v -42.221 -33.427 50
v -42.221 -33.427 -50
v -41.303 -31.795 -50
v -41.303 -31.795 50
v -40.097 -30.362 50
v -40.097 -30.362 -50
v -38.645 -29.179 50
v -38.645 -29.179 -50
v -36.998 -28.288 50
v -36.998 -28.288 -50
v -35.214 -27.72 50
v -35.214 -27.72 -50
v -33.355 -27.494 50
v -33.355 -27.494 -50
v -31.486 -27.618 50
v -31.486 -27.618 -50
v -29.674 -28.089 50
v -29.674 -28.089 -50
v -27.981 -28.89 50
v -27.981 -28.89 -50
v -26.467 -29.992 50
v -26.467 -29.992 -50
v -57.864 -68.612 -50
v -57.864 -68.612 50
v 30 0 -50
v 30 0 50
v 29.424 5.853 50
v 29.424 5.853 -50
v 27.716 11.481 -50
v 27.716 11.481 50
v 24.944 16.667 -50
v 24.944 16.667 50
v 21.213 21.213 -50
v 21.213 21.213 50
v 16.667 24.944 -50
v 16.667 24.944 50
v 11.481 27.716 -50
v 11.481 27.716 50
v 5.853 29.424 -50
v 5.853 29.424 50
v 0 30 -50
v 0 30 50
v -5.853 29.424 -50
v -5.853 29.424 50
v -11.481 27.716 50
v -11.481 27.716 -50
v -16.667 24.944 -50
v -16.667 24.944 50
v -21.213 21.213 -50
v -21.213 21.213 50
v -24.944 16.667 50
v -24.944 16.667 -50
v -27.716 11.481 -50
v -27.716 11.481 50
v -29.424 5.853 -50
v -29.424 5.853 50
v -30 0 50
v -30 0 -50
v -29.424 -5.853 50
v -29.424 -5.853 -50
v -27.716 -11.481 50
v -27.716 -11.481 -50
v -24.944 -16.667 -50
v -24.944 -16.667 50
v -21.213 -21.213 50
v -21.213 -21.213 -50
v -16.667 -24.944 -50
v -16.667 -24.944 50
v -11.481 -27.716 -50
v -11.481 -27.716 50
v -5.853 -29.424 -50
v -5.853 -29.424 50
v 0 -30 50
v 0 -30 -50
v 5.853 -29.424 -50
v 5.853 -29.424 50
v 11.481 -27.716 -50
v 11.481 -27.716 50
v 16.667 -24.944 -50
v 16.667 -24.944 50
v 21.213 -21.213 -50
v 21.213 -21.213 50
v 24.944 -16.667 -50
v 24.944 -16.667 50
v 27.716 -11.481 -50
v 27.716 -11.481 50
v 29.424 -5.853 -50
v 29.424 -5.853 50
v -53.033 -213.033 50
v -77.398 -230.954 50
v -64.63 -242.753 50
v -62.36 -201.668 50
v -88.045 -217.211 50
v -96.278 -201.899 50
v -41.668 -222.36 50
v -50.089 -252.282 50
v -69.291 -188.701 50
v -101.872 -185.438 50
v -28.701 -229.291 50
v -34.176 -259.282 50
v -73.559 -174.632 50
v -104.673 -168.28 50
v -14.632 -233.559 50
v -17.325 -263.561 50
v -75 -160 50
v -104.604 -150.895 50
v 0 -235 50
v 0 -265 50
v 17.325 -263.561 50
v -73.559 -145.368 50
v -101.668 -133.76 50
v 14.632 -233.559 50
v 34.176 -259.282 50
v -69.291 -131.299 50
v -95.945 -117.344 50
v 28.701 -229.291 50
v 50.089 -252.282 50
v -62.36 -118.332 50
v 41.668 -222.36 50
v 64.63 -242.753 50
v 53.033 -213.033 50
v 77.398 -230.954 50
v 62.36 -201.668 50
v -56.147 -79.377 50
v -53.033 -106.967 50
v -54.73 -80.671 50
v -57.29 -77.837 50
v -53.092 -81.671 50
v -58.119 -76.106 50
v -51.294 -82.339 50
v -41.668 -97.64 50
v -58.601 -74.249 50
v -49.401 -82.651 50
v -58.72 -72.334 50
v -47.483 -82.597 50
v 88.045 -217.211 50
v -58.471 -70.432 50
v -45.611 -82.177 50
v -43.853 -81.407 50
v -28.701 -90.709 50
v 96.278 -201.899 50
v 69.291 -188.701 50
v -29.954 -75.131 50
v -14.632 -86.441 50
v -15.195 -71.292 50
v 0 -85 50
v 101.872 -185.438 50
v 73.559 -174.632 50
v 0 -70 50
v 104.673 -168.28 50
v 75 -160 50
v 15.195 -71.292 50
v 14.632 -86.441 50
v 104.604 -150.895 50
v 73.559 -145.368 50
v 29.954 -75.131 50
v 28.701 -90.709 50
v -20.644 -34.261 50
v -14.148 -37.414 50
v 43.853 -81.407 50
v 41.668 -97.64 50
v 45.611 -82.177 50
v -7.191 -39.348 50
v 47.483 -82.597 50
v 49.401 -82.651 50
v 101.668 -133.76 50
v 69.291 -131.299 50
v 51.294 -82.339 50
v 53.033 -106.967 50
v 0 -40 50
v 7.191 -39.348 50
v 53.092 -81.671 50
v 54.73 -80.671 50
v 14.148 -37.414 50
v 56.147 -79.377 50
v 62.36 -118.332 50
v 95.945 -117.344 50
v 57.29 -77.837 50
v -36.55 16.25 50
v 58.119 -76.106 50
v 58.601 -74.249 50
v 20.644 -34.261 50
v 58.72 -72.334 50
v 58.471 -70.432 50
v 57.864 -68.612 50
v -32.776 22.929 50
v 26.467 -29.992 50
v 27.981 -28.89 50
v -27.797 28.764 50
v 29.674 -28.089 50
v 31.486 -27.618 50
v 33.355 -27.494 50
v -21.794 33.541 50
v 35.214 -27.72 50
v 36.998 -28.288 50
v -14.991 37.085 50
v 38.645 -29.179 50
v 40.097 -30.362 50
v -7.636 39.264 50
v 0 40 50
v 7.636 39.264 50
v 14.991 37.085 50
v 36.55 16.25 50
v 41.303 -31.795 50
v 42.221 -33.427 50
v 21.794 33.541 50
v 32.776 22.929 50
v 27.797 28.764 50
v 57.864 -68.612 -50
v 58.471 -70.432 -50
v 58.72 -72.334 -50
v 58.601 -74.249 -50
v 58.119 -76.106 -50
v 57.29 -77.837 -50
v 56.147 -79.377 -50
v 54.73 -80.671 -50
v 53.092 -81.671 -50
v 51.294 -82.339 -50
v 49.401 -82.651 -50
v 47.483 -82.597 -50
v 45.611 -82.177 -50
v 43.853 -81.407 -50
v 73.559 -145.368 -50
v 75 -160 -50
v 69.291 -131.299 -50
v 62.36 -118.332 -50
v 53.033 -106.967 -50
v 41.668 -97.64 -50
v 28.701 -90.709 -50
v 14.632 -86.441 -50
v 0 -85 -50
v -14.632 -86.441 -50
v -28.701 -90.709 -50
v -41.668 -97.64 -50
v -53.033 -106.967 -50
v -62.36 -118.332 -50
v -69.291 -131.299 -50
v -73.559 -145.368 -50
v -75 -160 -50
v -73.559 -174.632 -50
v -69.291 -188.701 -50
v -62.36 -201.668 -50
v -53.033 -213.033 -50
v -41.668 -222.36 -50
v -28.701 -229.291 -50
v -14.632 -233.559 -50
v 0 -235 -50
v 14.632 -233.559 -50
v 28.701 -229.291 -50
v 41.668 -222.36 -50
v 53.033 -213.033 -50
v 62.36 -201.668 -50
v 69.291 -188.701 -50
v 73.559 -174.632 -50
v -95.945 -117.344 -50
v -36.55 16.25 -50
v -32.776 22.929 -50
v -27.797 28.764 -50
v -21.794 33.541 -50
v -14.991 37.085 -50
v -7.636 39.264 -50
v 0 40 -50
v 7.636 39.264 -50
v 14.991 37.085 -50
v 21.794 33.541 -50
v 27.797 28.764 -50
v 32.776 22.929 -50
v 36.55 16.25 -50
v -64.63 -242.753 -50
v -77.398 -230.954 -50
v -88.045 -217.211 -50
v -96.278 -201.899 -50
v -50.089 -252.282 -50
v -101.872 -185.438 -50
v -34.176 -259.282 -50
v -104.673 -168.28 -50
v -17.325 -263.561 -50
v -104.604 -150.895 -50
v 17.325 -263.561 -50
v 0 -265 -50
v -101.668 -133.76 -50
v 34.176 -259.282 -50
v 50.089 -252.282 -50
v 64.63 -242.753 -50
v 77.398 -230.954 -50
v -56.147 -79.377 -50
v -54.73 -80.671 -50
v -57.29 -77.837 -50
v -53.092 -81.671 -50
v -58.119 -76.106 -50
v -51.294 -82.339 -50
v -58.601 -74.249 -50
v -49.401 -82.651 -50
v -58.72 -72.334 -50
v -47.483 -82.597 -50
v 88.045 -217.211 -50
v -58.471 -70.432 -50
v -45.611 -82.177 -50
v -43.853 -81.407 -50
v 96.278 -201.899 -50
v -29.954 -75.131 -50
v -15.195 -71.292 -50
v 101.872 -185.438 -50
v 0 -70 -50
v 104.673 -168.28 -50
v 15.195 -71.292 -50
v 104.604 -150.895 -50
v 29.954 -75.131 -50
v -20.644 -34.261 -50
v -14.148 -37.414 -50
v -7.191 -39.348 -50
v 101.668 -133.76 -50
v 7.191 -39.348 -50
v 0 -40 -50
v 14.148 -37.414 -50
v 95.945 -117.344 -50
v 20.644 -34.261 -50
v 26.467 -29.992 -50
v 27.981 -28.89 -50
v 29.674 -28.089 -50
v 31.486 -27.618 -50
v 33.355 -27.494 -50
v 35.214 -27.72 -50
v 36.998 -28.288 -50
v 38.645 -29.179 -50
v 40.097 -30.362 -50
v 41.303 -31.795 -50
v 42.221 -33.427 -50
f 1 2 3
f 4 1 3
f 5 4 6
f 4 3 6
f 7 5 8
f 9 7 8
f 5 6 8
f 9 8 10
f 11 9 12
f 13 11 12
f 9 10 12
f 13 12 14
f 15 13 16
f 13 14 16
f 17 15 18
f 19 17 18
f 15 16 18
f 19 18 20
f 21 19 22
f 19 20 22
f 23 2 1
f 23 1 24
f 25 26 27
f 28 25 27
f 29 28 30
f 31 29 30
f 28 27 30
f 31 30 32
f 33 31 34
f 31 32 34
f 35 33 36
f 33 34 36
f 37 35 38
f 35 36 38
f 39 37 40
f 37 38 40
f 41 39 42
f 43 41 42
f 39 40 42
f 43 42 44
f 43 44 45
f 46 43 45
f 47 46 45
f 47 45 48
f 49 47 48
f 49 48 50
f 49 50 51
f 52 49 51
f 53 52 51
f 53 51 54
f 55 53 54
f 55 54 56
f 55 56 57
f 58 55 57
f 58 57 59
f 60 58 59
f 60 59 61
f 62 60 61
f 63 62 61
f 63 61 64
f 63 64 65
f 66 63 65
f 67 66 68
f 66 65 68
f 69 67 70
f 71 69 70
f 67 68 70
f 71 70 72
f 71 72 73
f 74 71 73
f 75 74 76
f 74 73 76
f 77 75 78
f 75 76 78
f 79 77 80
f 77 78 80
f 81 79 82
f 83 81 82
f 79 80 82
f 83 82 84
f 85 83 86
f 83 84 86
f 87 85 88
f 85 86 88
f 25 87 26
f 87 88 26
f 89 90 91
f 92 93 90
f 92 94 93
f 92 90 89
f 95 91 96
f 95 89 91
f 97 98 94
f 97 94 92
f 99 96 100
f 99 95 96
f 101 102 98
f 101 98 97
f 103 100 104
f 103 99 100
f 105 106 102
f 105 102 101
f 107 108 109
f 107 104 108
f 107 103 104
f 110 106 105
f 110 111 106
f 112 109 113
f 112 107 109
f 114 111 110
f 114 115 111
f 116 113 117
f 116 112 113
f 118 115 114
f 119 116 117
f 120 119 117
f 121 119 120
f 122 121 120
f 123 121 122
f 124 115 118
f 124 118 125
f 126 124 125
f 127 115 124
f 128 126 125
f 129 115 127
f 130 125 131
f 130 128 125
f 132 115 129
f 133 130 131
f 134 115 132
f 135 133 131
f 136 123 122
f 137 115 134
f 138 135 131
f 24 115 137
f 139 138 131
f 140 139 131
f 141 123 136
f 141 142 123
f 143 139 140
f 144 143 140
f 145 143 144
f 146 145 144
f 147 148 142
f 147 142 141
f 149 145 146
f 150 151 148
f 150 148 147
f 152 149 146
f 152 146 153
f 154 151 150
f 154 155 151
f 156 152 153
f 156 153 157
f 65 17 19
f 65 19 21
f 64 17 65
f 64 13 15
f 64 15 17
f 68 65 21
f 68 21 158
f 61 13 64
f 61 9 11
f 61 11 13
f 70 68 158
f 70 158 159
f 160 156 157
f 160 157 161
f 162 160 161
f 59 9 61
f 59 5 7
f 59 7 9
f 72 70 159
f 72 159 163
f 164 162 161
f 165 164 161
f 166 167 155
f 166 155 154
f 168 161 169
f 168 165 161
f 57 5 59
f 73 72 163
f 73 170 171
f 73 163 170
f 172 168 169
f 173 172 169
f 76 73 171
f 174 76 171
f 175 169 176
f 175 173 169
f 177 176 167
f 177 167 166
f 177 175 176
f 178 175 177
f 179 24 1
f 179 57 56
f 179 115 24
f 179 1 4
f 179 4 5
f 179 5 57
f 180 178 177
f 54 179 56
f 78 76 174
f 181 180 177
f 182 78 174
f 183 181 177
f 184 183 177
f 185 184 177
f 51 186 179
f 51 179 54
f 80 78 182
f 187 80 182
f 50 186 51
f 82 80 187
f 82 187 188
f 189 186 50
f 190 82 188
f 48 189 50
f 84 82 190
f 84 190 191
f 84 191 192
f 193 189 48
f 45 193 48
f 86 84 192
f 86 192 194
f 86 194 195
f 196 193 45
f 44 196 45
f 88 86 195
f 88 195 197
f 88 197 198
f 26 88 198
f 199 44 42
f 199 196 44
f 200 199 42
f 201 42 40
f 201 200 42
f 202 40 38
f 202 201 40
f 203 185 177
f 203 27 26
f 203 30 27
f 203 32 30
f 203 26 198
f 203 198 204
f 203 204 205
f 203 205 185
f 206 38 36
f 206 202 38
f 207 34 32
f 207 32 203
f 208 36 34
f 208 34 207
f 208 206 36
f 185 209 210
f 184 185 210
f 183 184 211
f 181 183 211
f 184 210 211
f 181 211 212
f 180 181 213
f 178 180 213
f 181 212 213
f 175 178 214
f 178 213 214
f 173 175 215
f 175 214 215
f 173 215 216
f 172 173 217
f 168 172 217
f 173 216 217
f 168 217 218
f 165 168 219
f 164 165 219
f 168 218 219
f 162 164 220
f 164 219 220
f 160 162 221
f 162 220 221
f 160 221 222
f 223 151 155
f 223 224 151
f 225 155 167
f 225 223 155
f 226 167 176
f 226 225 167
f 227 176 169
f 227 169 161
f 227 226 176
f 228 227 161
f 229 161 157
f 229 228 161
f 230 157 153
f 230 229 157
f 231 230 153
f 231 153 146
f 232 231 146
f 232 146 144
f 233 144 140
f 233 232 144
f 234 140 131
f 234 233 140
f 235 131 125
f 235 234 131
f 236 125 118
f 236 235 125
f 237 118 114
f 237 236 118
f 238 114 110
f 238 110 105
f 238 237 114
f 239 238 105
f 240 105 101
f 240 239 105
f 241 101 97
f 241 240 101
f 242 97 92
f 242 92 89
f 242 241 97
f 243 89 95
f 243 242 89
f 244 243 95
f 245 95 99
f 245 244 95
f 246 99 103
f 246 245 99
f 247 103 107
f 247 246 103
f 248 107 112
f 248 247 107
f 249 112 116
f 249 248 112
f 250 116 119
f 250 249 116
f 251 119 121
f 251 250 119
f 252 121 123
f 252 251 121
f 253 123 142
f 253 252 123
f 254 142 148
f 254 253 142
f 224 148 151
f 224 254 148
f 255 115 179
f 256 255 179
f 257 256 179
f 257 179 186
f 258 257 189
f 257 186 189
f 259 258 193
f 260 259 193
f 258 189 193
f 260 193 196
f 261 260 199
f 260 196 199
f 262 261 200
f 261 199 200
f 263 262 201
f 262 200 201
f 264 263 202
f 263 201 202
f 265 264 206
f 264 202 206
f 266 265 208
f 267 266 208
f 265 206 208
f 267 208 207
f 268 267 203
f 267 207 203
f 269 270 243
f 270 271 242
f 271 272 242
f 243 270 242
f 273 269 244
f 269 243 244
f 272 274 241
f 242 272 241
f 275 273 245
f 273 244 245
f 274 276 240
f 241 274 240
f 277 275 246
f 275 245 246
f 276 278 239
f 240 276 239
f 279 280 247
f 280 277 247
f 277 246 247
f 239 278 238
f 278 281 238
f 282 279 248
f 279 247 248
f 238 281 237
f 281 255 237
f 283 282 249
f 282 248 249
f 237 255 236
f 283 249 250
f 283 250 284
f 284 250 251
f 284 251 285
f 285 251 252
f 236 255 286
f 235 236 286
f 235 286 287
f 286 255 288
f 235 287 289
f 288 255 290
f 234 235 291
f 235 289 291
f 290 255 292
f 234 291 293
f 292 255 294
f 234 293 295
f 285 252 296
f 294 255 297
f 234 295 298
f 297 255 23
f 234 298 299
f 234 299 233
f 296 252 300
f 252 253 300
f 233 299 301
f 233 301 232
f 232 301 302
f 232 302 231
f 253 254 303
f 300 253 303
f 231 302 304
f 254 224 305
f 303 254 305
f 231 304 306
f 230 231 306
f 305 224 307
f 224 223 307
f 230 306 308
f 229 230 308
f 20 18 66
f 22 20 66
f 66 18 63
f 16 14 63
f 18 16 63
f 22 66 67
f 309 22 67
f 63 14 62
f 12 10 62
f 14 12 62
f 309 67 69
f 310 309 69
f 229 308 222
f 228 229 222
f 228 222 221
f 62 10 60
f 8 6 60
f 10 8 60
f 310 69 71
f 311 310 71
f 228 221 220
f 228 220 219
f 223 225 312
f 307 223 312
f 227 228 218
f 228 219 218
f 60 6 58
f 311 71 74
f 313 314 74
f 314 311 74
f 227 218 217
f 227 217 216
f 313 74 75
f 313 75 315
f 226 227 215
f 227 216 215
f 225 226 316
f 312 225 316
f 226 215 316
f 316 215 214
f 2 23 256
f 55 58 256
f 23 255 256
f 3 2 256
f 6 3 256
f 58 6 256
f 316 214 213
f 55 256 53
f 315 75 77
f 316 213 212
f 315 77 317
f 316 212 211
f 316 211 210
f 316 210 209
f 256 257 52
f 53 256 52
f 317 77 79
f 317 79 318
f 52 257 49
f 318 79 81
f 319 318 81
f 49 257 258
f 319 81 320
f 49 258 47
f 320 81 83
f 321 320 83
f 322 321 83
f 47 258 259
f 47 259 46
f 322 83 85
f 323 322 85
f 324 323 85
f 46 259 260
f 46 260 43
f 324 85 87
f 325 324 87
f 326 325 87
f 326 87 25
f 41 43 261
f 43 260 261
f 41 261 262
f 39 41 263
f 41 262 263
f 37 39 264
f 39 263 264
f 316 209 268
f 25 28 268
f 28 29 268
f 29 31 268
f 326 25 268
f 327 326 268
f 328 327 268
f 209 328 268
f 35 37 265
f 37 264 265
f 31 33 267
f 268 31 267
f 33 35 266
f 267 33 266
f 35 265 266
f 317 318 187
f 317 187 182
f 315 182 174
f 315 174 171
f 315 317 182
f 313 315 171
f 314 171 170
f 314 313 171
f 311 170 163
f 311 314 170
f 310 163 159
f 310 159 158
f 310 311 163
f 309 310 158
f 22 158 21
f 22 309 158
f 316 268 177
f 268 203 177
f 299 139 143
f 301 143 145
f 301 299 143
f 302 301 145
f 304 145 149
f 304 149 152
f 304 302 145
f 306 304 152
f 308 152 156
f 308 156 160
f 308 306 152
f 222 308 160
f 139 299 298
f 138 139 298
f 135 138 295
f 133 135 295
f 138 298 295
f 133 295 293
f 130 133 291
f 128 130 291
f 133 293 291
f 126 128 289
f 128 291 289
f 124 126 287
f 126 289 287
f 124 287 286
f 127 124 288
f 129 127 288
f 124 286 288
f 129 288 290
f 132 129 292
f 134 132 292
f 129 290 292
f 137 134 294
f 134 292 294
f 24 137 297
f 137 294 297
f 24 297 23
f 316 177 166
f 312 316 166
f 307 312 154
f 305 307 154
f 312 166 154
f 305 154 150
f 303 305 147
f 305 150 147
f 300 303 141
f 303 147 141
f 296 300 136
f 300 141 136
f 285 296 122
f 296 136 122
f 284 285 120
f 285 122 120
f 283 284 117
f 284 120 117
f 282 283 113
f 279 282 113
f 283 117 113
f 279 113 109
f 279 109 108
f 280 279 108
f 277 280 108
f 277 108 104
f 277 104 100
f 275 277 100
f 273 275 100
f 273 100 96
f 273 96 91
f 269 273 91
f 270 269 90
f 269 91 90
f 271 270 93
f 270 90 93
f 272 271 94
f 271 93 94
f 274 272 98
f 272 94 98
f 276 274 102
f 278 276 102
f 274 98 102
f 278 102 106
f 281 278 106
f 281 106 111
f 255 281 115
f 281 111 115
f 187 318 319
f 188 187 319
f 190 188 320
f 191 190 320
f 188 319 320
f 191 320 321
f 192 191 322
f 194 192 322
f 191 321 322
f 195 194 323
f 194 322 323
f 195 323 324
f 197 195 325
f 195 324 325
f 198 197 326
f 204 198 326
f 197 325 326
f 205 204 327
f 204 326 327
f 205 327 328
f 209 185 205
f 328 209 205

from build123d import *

# Parameters (mm, degrees)
SKETCH1_R               = 75
BOSS_EXTRUDE1_DEPTH     = 50
CUT_EXTRUDE1_DEPTH      = 290.39592257
CUT_EXTRUDE1_DEPTH_BACK = 290.39592257
FILLET1_START           = -50
FILLET1_DEPTH           = 100
SKETCH3_R               = 30
CUT_EXTRUDE2_DEPTH      = 303.07614934


with BuildPart() as part:
    # Sketch1 → Boss-Extrude1 (new, symmetric)
    with BuildSketch(Plane.XY):
        with BuildLine():
            Line((-95.945006832, -117.34375), (-36.550478793, 16.25))
            ThreePointArc((-36.550478793, 16.25), (0, 40), (36.550478793, 16.25))
            Line((36.550478793, 16.25), (95.945006832, -117.34375))
            ThreePointArc((95.945006832, -117.34375), (0, -265), (-95.945006832, -117.34375))
        make_face()
        with Locations((0, -160)):
            Circle(SKETCH1_R, mode=Mode.SUBTRACT)
    extrude(amount=BOSS_EXTRUDE1_DEPTH, both=True)

    # Sketch2 → Cut-Extrude1 (cut, two sides: drawn at the far end of the back side and taken through both)
    with BuildSketch(Plane.XY.offset(-CUT_EXTRUDE1_DEPTH_BACK)):
        with BuildLine():
            Line((-35.52920143, -18.375958363), (-82.238577284, -123.4375))
            ThreePointArc((-82.238577284, -123.4375), (0, -70), (82.238577284, -123.4375))
            Line((82.238577284, -123.4375), (35.52920143, -18.375958363))
            ThreePointArc((35.52920143, -18.375958363), (0, -40), (-35.52920143, -18.375958363))
        make_face()
    extrude(amount=CUT_EXTRUDE1_DEPTH + CUT_EXTRUDE1_DEPTH_BACK, mode=Mode.SUBTRACT)

    # Fillet1: read off the stored shape, not the designer's step
    # Fillet1 outline → Fillet1 (add)
    with BuildSketch(Plane.XY.offset(FILLET1_START)):
        with BuildLine():
            ThreePointArc((-42.220939274, -33.427418189), (-35.213916082, -27.719526256), (-26.466655661, -29.991934551))
            ThreePointArc((-26.466655661, -29.991934551), (-31.537347698, -24.604790188), (-35.52920143, -18.375958363))
            Line((-35.52920143, -18.375958363), (-42.220939274, -33.427418189))
        make_face()
        with BuildLine():
            ThreePointArc((35.52920143, -18.375958363), (31.537347698, -24.604790188), (26.466655661, -29.991934551))
            ThreePointArc((26.466655661, -29.991934551), (35.213916082, -27.719526256), (42.220939274, -33.427418189))
            Line((42.220939274, -33.427418189), (35.52920143, -18.375958363))
        make_face()
        with BuildLine():
            ThreePointArc((-43.853361827, -81.406853629), (-55.469552548, -80.058313703), (-57.863577284, -68.61178181))
            Line((-57.863577284, -68.61178181), (-82.238577284, -123.4375))
            ThreePointArc((-82.238577284, -123.4375), (-66.45628703, -99.30764534), (-43.853361827, -81.406853629))
        make_face()
        with BuildLine():
            Line((82.238577284, -123.4375), (57.863577284, -68.61178181))
            ThreePointArc((57.863577284, -68.61178181), (55.469552548, -80.058313703), (43.853361827, -81.406853629))
            ThreePointArc((43.853361827, -81.406853629), (66.45628703, -99.30764534), (82.238577284, -123.4375))
        make_face()
    extrude(amount=FILLET1_DEPTH)

    # Sketch3 → Cut-Extrude2 (cut, through all)
    with BuildSketch(Plane.XY.offset(50)):
        Circle(SKETCH3_R)
    extrude(amount=-CUT_EXTRUDE2_DEPTH, mode=Mode.SUBTRACT)


solid = part.part
